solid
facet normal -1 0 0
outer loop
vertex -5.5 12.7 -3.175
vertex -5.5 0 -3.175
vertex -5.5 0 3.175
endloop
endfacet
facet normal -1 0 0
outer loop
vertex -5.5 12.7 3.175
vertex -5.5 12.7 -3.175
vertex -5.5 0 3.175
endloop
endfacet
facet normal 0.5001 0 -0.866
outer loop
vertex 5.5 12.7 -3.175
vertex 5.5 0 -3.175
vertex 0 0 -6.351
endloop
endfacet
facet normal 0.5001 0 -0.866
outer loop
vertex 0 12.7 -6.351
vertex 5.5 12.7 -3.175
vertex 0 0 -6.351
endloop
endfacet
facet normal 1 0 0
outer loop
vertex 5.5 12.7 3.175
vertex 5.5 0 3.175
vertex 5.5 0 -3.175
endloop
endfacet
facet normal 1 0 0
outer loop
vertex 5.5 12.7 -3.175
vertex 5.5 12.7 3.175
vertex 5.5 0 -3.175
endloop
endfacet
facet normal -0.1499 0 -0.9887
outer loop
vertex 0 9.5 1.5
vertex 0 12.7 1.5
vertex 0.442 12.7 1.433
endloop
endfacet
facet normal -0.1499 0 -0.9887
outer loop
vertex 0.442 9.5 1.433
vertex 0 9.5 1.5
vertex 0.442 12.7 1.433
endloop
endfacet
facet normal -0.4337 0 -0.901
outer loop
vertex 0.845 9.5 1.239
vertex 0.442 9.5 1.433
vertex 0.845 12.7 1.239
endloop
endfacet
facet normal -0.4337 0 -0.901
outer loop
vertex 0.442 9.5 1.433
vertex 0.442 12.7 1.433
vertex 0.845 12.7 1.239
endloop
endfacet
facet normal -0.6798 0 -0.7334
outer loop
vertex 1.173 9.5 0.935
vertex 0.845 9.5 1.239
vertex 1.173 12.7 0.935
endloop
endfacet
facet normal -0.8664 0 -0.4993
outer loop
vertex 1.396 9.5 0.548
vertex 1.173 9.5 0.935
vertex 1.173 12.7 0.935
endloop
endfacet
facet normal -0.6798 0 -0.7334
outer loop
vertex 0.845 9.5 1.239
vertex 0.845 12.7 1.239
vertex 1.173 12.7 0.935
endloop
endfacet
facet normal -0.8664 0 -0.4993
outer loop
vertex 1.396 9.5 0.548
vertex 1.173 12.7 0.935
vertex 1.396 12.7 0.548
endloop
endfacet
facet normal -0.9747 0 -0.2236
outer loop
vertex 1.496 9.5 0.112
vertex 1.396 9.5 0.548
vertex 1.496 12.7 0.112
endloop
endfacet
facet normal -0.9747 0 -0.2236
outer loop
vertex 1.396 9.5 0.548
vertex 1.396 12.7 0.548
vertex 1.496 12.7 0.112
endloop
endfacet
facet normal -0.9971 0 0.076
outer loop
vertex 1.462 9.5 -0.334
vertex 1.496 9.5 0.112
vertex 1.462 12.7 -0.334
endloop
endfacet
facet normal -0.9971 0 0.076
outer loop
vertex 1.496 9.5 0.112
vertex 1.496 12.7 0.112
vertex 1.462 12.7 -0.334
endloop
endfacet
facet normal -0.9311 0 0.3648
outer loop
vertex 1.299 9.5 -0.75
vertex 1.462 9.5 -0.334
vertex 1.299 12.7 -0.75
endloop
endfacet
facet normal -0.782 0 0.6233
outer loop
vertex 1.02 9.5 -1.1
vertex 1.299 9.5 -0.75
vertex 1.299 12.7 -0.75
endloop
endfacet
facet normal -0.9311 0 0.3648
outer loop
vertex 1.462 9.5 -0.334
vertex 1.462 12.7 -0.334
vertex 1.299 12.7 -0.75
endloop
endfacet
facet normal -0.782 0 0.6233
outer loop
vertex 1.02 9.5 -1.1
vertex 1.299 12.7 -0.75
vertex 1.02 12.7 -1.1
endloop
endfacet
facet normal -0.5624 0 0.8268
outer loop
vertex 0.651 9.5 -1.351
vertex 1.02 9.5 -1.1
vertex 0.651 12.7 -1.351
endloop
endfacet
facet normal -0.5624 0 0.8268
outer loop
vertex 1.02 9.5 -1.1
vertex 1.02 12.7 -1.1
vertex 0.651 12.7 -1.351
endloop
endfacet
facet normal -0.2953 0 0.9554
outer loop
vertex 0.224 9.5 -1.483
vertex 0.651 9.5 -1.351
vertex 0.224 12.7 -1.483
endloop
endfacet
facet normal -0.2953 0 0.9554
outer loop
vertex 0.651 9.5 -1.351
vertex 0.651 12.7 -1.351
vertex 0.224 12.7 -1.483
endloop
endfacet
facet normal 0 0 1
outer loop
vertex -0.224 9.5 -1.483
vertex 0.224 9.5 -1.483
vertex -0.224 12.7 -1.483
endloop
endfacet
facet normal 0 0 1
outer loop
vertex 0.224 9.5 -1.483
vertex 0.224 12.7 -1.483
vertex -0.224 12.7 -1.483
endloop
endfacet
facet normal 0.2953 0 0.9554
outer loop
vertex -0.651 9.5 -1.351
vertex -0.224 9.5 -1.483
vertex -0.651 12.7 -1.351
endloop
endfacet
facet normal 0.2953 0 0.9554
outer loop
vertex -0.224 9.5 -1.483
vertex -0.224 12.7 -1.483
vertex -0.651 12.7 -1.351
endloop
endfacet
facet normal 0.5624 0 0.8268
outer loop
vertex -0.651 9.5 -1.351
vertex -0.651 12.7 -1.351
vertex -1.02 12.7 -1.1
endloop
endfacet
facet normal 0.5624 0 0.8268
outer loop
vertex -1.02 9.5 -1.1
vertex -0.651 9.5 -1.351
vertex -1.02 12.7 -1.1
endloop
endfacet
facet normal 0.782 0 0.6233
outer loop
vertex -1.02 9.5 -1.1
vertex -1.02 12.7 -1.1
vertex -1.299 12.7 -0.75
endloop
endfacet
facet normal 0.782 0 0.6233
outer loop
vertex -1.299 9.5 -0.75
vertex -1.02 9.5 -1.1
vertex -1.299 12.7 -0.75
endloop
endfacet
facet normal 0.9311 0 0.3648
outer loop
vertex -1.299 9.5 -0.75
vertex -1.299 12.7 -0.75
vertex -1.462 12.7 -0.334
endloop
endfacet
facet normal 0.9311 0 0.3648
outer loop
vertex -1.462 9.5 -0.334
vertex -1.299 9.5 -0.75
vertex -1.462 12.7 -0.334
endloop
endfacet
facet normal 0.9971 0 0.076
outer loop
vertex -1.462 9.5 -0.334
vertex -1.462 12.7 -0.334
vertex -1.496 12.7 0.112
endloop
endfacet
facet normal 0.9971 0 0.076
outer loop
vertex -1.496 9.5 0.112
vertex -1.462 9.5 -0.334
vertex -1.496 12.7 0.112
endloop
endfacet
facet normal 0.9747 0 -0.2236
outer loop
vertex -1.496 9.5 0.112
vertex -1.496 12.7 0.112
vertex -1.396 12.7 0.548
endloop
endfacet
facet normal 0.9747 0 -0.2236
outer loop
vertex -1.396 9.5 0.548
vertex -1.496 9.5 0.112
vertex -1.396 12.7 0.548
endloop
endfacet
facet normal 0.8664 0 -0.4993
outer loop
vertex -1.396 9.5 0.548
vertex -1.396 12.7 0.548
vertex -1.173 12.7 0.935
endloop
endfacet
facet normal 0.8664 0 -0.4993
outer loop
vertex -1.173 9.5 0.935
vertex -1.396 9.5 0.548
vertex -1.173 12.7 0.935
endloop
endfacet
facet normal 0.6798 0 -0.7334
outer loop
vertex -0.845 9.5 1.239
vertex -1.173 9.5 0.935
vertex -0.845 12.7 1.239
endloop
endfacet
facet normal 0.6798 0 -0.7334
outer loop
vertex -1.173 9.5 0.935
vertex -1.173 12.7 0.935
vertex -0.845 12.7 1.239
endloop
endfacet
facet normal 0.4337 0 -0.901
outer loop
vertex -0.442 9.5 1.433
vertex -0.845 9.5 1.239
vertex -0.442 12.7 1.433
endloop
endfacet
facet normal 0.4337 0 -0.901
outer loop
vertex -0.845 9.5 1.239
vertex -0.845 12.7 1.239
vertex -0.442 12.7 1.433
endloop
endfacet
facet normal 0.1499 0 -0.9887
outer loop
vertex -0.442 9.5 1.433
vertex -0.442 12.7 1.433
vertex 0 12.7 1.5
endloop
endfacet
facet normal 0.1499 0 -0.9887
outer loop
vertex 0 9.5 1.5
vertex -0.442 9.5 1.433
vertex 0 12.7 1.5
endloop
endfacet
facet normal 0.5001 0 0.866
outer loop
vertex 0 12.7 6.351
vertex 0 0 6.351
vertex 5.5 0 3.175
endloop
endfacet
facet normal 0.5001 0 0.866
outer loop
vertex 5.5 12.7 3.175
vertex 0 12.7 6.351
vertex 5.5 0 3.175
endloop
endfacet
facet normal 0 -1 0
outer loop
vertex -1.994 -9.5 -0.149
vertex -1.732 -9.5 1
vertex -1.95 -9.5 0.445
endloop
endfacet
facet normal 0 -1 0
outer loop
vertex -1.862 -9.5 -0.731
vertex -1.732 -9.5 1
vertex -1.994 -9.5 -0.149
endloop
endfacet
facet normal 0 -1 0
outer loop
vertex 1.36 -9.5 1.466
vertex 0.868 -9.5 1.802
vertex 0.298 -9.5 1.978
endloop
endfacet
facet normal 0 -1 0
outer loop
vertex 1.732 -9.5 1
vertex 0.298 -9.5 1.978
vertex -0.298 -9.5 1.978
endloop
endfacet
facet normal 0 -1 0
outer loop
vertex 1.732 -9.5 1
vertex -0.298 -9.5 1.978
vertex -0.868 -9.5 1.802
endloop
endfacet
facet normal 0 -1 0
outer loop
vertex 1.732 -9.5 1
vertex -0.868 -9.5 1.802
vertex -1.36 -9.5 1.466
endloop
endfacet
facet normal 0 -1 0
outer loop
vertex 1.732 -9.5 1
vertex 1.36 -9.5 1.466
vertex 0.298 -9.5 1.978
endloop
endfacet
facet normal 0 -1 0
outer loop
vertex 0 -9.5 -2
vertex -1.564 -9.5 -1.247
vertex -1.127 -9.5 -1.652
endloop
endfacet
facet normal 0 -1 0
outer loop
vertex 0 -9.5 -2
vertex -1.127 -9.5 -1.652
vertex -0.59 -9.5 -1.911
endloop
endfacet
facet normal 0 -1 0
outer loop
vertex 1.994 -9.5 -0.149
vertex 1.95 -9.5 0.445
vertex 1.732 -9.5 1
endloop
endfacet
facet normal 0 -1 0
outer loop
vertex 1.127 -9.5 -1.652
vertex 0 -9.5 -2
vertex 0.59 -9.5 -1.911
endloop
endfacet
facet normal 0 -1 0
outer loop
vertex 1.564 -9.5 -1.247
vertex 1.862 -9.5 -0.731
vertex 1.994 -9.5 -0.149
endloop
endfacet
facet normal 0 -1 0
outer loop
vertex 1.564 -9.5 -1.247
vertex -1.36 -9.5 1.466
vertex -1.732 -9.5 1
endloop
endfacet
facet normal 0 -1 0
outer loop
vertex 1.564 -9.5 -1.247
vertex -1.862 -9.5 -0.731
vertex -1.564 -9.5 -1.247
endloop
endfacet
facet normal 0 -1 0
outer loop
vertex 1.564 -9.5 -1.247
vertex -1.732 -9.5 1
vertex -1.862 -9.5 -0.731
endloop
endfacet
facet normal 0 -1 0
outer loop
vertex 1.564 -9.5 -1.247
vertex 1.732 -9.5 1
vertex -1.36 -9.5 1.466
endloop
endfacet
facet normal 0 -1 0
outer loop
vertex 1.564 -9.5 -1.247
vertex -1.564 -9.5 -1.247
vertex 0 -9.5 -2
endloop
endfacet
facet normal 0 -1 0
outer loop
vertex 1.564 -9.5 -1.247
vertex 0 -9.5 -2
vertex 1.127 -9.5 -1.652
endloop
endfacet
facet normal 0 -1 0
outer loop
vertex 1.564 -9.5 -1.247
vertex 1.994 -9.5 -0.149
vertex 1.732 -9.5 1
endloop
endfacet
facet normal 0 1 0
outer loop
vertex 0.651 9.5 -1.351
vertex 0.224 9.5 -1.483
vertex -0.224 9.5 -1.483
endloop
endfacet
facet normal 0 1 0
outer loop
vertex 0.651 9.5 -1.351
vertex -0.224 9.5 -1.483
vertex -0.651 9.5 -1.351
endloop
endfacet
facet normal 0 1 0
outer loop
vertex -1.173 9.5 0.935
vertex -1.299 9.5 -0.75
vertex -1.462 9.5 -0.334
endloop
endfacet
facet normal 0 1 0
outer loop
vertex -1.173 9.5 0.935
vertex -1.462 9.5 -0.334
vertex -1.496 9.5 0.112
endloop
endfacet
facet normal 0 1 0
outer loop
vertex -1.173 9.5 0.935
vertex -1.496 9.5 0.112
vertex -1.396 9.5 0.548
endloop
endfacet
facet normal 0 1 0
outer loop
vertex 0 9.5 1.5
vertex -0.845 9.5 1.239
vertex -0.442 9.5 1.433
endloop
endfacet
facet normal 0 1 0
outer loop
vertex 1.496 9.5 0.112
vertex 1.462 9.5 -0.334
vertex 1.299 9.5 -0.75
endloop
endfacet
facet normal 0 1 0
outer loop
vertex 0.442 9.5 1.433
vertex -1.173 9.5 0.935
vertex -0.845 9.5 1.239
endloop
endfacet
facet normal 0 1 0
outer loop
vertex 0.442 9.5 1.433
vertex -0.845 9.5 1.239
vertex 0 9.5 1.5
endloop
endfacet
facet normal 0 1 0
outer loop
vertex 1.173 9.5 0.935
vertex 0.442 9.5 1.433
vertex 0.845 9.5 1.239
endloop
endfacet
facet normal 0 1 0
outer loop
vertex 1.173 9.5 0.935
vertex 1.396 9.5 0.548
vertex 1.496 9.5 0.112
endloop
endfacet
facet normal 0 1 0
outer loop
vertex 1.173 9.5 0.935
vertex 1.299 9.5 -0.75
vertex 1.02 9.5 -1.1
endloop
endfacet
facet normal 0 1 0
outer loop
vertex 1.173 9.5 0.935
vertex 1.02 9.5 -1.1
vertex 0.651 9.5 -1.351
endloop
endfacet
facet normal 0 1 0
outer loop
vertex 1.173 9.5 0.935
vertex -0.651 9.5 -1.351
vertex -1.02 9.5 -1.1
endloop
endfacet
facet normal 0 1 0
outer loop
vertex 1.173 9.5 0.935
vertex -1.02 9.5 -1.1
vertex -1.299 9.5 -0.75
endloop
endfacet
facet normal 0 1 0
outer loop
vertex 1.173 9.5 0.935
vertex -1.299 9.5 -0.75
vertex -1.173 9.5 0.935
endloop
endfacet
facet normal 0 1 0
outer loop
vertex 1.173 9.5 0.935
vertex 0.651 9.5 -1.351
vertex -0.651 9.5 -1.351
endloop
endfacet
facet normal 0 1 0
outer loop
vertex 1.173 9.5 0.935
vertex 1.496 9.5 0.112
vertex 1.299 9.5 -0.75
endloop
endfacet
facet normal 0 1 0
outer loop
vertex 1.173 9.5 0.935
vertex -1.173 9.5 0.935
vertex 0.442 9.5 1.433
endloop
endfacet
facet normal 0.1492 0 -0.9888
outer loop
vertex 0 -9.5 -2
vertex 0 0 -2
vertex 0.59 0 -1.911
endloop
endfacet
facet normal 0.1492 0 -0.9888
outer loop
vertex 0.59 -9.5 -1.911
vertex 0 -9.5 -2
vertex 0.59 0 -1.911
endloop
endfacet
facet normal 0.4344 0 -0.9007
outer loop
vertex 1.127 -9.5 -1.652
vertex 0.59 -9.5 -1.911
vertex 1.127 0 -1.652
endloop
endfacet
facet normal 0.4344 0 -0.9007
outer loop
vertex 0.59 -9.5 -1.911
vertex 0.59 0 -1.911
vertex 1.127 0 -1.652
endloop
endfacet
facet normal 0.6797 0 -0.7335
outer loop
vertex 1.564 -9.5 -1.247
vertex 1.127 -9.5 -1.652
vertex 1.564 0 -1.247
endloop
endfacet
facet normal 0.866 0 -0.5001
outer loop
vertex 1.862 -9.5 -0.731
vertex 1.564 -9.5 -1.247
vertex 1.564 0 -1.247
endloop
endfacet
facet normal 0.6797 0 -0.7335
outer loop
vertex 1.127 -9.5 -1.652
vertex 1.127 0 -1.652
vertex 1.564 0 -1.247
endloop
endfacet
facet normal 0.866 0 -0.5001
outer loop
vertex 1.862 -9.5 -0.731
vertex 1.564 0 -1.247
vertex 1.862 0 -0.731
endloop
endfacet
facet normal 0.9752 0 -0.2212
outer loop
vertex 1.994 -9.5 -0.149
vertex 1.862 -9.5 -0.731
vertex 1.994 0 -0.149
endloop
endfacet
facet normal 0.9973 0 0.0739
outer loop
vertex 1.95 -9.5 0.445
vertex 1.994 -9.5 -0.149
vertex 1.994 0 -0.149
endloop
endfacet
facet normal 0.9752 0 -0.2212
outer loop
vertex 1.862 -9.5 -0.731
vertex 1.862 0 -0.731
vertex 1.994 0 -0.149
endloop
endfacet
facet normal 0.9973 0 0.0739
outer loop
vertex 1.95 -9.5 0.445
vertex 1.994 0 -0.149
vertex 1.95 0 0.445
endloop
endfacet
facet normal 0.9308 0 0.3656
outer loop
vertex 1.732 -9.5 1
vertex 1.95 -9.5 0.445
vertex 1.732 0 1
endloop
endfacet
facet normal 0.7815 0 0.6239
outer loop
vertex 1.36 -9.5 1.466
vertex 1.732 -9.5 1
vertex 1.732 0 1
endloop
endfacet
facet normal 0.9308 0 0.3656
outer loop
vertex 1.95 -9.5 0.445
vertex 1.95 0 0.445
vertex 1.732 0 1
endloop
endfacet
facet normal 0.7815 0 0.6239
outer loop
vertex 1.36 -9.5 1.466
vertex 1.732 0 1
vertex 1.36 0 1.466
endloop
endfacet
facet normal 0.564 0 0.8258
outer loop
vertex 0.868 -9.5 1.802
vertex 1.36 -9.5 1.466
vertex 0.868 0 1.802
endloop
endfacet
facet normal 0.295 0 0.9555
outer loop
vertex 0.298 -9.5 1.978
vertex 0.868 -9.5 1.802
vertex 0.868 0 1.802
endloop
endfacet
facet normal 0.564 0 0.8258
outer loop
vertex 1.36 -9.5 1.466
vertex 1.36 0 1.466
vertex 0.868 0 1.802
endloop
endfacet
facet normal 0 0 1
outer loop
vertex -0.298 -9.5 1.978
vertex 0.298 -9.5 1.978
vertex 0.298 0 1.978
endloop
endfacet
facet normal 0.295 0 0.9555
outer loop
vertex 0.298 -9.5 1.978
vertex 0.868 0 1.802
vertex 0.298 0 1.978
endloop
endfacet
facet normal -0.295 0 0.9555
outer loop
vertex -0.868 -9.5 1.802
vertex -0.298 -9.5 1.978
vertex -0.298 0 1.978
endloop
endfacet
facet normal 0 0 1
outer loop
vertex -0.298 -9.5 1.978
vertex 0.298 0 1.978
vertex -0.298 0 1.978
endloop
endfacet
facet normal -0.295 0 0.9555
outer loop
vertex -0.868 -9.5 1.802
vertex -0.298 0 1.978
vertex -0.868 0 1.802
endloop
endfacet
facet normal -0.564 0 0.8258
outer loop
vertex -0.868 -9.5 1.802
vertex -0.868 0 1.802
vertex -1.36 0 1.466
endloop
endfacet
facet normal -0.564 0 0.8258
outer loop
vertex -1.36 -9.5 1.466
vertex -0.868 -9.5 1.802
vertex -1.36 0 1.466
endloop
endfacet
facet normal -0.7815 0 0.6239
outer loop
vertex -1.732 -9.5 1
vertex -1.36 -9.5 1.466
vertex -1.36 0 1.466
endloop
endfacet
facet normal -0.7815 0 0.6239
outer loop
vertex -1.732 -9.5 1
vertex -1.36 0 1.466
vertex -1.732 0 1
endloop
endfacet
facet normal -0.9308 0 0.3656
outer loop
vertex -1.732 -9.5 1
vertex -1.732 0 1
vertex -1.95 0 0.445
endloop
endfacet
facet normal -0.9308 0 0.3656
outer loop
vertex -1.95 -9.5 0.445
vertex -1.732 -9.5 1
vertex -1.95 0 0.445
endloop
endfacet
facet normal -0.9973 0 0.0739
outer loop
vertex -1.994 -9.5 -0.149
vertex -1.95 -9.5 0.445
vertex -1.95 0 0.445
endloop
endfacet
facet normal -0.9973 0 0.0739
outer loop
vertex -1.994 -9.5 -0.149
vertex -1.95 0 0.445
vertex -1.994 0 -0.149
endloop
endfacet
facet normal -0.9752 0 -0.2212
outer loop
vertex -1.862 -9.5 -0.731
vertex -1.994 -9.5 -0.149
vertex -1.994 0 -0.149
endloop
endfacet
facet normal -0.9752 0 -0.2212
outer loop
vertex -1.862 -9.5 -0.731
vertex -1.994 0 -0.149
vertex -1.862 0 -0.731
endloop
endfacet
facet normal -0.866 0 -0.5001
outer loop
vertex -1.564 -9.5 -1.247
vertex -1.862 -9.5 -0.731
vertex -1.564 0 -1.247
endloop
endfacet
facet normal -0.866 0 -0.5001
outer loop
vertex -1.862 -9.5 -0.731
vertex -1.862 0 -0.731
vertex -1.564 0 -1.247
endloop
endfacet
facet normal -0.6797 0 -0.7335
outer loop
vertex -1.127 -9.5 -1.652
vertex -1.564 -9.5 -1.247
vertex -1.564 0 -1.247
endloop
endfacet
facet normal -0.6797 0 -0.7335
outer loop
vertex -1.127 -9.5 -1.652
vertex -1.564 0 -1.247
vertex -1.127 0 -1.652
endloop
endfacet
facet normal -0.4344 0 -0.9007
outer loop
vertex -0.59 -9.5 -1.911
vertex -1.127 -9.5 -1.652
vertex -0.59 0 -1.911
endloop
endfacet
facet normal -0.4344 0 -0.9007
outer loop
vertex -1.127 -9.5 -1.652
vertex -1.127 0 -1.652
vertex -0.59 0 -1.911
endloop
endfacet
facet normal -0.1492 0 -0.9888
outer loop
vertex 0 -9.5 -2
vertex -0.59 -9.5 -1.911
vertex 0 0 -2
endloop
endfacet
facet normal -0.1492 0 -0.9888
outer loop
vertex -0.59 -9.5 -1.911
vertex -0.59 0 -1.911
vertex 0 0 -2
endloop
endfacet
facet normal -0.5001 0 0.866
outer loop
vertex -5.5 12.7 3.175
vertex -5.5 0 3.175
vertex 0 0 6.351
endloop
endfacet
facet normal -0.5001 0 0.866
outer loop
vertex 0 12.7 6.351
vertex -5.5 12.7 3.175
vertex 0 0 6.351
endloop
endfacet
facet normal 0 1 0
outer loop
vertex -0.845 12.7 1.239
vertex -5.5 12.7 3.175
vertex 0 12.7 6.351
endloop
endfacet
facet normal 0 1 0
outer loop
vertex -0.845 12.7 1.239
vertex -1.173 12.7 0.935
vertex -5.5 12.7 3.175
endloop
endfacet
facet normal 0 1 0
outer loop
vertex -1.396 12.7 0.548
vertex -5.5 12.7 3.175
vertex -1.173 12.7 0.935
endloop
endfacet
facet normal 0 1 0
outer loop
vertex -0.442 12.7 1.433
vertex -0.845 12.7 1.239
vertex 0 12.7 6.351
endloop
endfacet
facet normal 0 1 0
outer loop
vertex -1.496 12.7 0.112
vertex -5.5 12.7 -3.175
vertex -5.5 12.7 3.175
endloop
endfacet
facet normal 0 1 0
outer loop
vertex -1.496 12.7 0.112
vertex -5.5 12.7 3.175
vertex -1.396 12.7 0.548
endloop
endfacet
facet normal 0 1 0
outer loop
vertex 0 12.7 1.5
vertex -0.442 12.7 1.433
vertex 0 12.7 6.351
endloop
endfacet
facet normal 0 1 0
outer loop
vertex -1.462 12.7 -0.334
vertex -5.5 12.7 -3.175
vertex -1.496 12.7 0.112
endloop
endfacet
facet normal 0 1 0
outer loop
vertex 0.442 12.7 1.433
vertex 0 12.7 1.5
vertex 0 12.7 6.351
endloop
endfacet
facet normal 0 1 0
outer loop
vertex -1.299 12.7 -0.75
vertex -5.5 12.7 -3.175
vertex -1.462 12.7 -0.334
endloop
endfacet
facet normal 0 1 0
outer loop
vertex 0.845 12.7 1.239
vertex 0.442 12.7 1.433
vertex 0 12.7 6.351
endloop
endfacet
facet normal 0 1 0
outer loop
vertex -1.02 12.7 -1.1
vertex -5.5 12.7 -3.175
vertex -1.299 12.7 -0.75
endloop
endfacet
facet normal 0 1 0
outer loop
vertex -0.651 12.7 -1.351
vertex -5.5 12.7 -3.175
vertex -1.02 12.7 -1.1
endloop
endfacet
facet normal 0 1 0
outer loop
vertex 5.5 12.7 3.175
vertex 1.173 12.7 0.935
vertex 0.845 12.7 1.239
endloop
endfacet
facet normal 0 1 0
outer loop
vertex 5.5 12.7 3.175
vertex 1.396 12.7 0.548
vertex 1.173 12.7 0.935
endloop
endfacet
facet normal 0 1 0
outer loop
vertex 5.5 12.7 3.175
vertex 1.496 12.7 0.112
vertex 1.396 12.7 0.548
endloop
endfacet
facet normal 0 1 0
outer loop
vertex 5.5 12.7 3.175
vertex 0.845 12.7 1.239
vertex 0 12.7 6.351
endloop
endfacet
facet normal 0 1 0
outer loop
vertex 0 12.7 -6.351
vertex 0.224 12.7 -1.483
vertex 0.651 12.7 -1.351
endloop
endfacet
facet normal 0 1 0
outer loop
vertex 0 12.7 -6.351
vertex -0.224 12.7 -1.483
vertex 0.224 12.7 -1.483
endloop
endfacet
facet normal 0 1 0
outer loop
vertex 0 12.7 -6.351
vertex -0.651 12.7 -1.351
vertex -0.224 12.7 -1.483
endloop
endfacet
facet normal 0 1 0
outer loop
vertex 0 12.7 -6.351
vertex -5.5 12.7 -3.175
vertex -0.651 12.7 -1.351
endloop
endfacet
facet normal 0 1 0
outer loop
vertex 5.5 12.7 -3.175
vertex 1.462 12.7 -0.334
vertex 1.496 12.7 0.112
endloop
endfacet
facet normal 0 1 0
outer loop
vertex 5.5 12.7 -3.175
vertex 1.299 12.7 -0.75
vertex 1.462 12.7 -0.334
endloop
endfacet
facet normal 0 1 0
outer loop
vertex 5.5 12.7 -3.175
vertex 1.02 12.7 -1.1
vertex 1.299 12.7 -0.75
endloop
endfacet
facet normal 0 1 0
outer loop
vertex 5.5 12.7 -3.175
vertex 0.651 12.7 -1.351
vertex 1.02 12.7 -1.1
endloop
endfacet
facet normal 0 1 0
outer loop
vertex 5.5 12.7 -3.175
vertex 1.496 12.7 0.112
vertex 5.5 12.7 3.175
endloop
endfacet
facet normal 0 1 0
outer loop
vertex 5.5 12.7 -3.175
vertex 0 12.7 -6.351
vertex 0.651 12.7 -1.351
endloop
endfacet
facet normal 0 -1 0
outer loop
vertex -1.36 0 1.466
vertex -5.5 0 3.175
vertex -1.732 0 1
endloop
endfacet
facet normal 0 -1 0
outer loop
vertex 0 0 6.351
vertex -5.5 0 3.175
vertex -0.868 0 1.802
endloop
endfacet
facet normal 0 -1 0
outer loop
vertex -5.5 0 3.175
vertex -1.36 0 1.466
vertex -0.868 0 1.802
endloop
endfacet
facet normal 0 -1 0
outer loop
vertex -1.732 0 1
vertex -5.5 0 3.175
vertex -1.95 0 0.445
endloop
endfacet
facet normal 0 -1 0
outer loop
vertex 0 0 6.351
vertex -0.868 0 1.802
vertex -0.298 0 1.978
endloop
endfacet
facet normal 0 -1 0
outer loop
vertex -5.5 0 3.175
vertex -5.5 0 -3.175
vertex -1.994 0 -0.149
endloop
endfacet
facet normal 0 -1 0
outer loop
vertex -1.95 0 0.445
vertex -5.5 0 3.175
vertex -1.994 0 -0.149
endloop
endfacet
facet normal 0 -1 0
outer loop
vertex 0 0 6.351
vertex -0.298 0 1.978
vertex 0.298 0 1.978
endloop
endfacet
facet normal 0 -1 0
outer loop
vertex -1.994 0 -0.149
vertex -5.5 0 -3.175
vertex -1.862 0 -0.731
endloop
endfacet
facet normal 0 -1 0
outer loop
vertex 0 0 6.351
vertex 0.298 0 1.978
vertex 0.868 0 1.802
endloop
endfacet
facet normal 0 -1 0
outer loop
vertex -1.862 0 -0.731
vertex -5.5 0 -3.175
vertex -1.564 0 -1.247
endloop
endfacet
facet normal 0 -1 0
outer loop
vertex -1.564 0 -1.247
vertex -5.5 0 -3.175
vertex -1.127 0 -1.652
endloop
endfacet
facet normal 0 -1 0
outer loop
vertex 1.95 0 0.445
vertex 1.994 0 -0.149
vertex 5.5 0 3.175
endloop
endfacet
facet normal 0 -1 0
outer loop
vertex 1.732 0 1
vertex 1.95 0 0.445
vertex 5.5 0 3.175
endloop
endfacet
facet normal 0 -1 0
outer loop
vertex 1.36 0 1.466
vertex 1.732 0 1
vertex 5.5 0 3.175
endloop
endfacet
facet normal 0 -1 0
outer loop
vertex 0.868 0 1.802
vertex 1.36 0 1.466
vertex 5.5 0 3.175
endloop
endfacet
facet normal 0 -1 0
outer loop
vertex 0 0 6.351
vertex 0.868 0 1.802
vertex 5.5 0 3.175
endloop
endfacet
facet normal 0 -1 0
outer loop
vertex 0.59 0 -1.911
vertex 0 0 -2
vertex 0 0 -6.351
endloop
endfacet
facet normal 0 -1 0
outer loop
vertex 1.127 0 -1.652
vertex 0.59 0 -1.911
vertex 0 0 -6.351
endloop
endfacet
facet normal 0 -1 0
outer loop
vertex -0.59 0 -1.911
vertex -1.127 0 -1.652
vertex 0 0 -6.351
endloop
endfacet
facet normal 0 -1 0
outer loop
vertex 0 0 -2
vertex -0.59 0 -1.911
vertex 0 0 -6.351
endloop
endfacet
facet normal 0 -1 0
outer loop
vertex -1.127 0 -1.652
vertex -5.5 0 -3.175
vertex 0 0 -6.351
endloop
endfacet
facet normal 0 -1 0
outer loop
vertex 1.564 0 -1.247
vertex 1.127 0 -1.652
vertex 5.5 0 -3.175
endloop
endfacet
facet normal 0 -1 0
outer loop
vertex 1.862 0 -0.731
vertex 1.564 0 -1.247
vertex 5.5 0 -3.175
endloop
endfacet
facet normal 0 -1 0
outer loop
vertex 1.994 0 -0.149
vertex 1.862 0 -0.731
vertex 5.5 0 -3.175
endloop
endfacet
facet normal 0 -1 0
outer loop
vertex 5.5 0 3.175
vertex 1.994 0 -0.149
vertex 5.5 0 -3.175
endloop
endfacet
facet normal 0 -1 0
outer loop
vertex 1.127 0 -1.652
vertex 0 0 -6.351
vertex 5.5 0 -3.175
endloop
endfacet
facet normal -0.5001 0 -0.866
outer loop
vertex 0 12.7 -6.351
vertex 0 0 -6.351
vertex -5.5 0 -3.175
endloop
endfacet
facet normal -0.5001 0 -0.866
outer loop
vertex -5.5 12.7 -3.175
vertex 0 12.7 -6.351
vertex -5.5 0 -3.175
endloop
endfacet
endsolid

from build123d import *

# Parameters (mm, degrees)
BOSS_EXTRUDE1_DEPTH = 12.7
SKETCH2_R           = 1.5
CUT_EXTRUDE1_DEPTH  = 3.2
SKETCH3_R           = 2
BOSS_EXTRUDE2_DEPTH = 9.5


with BuildPart() as part:
    # Sketch1 → Boss-Extrude1 (new body)
    with BuildSketch(Plane(origin=(0, 0, 0), x_dir=(1, 0, 0), z_dir=(0, 1, 0))):
        Polygon((0, 6.350852961), (-5.5, 3.175426481), (-5.5, -3.175426481), (0, -6.350852961), (5.5, -3.175426481), (5.5, 3.175426481), align=None)
    extrude(amount=BOSS_EXTRUDE1_DEPTH)

    # Sketch2 → Cut-Extrude1 (cut)
    with BuildSketch(Plane(origin=(0, 12.7, 0), x_dir=(1, 0, 0), z_dir=(0, 1, 0))):
        with Locations(Location((0, 0, 0), (0, 0, 270))):
            Circle(SKETCH2_R)
    extrude(amount=-CUT_EXTRUDE1_DEPTH, mode=Mode.SUBTRACT)

    # Sketch3 → Boss-Extrude2 (add)
    with BuildSketch(Plane.XZ):
        with Locations(Location((0, 0, 0), (0, 0, 270))):
            Circle(SKETCH3_R)
    extrude(amount=BOSS_EXTRUDE2_DEPTH)


solid = part.part
